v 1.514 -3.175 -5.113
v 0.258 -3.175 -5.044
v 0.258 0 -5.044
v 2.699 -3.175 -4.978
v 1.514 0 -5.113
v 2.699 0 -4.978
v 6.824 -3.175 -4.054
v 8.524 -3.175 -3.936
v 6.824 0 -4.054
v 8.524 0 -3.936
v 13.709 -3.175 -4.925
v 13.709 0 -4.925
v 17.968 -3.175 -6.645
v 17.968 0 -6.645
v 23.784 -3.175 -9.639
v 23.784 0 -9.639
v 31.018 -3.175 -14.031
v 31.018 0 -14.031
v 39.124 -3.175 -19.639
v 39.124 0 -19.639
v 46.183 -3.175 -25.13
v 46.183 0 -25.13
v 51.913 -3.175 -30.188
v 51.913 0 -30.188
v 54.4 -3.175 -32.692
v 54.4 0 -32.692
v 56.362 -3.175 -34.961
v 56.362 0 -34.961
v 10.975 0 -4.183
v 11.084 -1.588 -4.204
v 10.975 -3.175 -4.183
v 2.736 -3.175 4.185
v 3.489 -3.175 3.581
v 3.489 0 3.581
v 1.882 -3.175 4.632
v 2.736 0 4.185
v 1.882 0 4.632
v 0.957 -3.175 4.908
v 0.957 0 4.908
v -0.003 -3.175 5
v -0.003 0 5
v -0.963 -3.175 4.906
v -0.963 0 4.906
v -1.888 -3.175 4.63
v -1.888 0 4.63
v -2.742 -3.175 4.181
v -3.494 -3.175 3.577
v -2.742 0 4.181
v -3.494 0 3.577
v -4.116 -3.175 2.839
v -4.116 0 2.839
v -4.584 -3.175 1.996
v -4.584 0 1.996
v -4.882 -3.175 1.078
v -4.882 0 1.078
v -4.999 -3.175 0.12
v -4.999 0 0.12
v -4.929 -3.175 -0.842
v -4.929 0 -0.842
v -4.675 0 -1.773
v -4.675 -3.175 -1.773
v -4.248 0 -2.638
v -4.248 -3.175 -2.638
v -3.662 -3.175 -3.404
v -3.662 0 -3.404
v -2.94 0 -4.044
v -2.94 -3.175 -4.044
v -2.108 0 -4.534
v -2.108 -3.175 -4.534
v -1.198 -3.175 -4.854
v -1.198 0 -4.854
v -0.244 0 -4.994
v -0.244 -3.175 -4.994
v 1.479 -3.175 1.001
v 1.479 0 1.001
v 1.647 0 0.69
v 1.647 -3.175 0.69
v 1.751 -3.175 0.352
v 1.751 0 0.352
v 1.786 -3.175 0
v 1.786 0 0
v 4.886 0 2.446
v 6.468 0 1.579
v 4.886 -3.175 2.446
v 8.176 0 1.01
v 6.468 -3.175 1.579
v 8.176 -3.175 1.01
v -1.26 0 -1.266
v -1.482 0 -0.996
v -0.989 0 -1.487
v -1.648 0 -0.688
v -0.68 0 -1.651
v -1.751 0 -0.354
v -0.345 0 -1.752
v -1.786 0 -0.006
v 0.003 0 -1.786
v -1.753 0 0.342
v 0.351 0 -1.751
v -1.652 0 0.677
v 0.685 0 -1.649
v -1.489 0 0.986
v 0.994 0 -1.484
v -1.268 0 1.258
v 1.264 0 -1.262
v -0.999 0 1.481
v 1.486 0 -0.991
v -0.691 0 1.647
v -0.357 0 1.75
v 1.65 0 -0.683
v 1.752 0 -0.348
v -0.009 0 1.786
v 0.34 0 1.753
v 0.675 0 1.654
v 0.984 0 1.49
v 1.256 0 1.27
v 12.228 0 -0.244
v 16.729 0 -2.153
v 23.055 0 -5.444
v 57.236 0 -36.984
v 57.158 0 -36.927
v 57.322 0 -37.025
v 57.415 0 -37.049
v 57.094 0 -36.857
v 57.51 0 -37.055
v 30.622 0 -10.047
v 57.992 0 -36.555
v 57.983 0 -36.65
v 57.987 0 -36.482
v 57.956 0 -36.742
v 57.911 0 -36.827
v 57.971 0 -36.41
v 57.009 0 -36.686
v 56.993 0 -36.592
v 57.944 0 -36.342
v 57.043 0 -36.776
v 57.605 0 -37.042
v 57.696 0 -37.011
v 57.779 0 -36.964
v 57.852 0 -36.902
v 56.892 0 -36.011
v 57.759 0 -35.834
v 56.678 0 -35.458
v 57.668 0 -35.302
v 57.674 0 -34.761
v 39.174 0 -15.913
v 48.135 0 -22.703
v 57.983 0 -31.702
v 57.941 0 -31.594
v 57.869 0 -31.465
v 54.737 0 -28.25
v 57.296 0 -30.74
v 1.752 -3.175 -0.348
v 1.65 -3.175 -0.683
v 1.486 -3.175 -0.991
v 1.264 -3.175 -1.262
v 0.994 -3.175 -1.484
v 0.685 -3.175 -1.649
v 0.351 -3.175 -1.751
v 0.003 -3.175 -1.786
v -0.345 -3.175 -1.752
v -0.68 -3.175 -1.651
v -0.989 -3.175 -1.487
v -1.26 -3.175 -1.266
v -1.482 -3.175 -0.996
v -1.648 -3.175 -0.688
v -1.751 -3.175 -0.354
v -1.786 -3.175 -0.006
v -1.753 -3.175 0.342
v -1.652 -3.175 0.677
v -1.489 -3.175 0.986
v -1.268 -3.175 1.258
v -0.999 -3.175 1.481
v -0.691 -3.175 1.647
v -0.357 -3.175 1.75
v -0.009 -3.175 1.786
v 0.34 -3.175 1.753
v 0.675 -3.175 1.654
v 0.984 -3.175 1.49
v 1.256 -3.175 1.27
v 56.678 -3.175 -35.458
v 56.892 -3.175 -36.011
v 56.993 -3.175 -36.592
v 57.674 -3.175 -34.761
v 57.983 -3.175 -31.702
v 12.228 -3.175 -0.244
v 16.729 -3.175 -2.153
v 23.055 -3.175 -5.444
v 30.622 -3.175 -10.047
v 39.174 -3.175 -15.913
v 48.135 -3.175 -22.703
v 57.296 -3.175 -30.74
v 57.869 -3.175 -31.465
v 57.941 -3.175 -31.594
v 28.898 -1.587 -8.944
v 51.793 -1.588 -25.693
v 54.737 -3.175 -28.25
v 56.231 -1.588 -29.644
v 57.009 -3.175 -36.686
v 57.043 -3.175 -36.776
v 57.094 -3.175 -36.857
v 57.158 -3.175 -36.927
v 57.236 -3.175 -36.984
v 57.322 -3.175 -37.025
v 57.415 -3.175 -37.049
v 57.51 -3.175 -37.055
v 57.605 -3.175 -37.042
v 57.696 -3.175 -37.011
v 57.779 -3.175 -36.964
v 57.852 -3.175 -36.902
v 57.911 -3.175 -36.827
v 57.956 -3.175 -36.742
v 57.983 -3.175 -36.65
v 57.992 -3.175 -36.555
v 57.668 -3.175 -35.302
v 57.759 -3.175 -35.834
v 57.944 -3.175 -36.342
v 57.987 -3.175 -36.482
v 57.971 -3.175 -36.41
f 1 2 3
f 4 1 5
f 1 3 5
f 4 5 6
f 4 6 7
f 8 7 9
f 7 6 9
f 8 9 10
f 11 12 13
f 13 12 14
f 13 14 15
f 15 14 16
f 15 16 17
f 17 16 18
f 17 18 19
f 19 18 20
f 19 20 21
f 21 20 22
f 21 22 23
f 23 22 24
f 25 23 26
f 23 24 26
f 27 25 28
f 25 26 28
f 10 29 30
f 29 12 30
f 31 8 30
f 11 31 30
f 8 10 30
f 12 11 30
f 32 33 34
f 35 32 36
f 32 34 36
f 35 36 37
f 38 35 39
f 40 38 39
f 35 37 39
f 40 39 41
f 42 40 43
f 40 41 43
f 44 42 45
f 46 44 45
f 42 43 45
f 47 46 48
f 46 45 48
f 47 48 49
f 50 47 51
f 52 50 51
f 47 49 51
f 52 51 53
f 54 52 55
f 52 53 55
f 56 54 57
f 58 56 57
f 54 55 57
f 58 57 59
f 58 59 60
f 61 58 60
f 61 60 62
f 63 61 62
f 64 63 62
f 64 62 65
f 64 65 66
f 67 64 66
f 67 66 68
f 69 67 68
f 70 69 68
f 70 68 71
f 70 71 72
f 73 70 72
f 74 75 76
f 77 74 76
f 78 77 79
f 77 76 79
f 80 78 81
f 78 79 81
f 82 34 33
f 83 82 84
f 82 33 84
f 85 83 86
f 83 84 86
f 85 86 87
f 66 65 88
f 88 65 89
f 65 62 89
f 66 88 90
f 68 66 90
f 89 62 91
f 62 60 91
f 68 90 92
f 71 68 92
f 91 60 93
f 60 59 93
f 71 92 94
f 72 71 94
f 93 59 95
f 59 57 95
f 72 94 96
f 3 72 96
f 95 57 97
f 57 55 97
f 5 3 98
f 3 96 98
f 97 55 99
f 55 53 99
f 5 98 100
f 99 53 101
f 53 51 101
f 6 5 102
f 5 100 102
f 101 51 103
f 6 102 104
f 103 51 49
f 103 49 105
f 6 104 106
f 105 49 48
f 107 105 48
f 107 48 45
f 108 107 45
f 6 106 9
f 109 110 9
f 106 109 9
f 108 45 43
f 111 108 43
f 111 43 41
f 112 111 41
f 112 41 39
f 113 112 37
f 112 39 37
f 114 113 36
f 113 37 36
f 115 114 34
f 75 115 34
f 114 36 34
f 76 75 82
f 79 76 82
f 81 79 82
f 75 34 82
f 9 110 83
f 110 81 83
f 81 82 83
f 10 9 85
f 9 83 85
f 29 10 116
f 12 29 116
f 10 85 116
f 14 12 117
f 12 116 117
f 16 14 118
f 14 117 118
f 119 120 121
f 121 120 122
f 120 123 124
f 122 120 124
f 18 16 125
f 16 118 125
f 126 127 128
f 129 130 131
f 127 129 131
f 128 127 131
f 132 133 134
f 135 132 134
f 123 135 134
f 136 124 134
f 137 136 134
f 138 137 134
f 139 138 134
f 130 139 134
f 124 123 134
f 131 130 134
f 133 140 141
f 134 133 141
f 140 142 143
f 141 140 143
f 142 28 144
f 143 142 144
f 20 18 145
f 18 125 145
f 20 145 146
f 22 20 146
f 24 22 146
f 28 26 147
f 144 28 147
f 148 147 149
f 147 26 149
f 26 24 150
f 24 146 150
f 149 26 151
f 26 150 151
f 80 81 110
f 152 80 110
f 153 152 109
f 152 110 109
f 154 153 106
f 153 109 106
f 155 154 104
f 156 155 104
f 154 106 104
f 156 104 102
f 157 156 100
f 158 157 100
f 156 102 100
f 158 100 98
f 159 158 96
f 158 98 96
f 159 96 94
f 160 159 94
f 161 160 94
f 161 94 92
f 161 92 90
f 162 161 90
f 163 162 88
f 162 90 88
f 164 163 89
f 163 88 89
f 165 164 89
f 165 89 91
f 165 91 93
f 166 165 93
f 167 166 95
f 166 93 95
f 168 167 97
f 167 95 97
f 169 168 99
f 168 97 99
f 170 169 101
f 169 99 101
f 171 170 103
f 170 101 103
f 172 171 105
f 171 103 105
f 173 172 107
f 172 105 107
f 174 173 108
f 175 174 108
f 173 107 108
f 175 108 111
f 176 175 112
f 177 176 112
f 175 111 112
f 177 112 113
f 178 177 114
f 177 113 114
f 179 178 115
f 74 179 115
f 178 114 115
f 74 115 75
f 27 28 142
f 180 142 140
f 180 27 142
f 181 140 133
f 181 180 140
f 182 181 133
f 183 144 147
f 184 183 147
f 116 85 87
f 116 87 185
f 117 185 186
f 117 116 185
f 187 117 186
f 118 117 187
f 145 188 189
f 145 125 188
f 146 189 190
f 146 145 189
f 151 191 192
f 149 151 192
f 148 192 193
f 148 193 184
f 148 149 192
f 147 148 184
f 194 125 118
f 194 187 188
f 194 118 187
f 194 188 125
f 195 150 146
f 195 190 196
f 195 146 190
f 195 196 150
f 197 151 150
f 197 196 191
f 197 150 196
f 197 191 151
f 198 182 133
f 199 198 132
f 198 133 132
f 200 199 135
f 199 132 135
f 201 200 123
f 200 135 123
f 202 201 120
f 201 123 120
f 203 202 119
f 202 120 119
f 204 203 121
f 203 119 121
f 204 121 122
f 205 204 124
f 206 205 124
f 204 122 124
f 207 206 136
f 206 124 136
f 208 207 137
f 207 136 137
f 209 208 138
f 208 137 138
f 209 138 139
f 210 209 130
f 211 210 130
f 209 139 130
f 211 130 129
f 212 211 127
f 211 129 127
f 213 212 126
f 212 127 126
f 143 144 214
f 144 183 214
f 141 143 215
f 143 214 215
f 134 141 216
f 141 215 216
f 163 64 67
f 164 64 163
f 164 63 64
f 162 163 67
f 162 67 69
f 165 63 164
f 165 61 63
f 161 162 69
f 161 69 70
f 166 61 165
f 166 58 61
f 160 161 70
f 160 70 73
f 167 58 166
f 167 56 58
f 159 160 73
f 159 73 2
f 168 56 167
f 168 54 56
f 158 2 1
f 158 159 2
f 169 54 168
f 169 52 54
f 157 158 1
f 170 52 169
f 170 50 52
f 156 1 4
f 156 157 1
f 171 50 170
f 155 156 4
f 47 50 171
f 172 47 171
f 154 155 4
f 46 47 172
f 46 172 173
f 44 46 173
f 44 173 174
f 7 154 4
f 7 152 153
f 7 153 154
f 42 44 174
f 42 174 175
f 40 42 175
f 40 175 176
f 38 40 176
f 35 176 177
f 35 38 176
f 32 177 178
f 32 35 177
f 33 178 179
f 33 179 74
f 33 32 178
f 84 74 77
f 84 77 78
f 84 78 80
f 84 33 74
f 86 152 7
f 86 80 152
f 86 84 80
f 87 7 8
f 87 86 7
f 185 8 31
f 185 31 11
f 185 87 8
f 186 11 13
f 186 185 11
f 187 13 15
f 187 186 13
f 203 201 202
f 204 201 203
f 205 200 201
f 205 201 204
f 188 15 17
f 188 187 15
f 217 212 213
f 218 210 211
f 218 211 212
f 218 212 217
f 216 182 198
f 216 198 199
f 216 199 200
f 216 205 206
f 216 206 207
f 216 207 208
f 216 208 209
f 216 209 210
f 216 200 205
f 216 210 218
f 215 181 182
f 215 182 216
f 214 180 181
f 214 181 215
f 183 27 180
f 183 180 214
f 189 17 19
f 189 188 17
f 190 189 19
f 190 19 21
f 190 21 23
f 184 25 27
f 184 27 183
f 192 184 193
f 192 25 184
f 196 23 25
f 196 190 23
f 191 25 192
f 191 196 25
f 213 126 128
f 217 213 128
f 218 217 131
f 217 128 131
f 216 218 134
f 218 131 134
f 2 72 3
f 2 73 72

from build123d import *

# Parameters (mm, degrees)
F1_DEPTH = 3.175
F2_R     = 10
F3_R     = 5
F4_R     = 3


# Not quite as in the source:
# - a length typed as a fraction of an inch, garbled in the dataset ("3 / 203.2 mm" for 3/8 in), is restored


with BuildPart() as f1:
    # F0 (on Front) → F1 (new body)
    with BuildSketch(Plane.XZ):
        with BuildLine():
            ThreePointArc((5, 0), (4.9416586843, 0.7615835135), (4.7679962208, 1.5053943132))
            ThreePointArc((4.7679962208, 1.5053943132), (-4.0328012328, 2.9557594992), (0, -5))
            ThreePointArc((0, -5), (3.5355339059, -3.5355339059), (5, 0))
        make_face()
        with BuildLine():
            ThreePointArc((1.4790914289, 1.0009302168), (1.7075036754, 0.5234538686), (1.7859375, 0))
            ThreePointArc((1.7859375, 0), (-1.7075036754, -0.5234538686), (1.4790914289, 1.0009302168))
        make_face(mode=Mode.SUBTRACT)
        with BuildLine():
            add(Edge.make_bspline(
                [(4.7679962208, 1.5053943132), (10.5227651302, 1.3088265612), (33.1362274433, -9.6066408427), (57.5003811193, -30.0100648608), (57.9834021628, -31.7015722394)],
                knots=[0.1250018118, 0.1250018118, 0.1250018118, 0.1250018118, 0.4750790038, 1, 1, 1, 1], degree=3))
            ThreePointArc((4.7679962208, 1.5053943132), (4.9416586843, 0.7615835135), (5, 0))
            ThreePointArc((5, 0), (3.5355339059, -3.5355339059), (0, -5))
            add(Edge.make_bspline(
                [(0, -5), (3.595217635, -5.6845152728), (10.4140448254, 2.5517302892), (51.028263127, -26.9198999285), (57.2202324906, -36.1351662136)],
                knots=[0, 0, 0, 0, 0.3070952206, 0.9894399722, 0.9894399722, 0.9894399722, 0.9894399722], degree=3))
            ThreePointArc((57.2202324906, -36.1351662136), (57.3746325338, -36.0688709445), (57.5422763348, -36.0574695402))
            Line((57.5422763348, -36.0574695402), (57.9834021628, -31.7015722394))
        make_face()
        with BuildLine():
            ThreePointArc((57.5422763348, -36.0574695402), (57.3746325338, -36.0688709445), (57.2202324906, -36.1351662136))
            add(Edge.make_bspline(
                [(57.2202324906, -36.1351662136), (57.316059957, -36.2777824909), (57.40666212, -36.4177380179), (57.4918985367, -36.5549251437)],
                knots=[0.9894399722, 0.9894399722, 0.9894399722, 0.9894399722, 1, 1, 1, 1], degree=3))
            Line((57.4918985367, -36.5549251437), (57.5422763348, -36.0574695402))
        make_face()
        with BuildLine():
            add(Edge.make_bspline(
                [(57.2202324906, -36.1351662136), (57.316059957, -36.2777824909), (57.40666212, -36.4177380179), (57.4918985367, -36.5549251437)],
                knots=[0.9894399722, 0.9894399722, 0.9894399722, 0.9894399722, 1, 1, 1, 1], degree=3))
            ThreePointArc((57.2202324906, -36.1351662136), (57.2529770255, -36.9941477655), (57.9918985367, -36.5549251437))
            ThreePointArc((57.9918985367, -36.5549251437), (57.8628357949, -36.2196557737), (57.5422763348, -36.0574695402))
            Line((57.5422763348, -36.0574695402), (57.4918985367, -36.5549251437))
        make_face()
    extrude(amount=F1_DEPTH)

    # F2
    f2_edges = [f1.edges().sort_by_distance(p)[0] for p in [
        (4.767996, -1.5875, 1.505394),
    ]]
    fillet(f2_edges, radius=F2_R)

    # F3
    f3_edges = [f1.edges().sort_by_distance(p)[0] for p in [
        (0, -1.5875, -5),
    ]]
    fillet(f3_edges, radius=F3_R)

    # F4
    f4_edges = [f1.edges().sort_by_distance(p)[0] for p in [
        (57.542276, -1.5875, -36.05747),
        (57.220232, -1.5875, -36.135166),
    ]]
    fillet(f4_edges, radius=F4_R)


solid = f1.part
